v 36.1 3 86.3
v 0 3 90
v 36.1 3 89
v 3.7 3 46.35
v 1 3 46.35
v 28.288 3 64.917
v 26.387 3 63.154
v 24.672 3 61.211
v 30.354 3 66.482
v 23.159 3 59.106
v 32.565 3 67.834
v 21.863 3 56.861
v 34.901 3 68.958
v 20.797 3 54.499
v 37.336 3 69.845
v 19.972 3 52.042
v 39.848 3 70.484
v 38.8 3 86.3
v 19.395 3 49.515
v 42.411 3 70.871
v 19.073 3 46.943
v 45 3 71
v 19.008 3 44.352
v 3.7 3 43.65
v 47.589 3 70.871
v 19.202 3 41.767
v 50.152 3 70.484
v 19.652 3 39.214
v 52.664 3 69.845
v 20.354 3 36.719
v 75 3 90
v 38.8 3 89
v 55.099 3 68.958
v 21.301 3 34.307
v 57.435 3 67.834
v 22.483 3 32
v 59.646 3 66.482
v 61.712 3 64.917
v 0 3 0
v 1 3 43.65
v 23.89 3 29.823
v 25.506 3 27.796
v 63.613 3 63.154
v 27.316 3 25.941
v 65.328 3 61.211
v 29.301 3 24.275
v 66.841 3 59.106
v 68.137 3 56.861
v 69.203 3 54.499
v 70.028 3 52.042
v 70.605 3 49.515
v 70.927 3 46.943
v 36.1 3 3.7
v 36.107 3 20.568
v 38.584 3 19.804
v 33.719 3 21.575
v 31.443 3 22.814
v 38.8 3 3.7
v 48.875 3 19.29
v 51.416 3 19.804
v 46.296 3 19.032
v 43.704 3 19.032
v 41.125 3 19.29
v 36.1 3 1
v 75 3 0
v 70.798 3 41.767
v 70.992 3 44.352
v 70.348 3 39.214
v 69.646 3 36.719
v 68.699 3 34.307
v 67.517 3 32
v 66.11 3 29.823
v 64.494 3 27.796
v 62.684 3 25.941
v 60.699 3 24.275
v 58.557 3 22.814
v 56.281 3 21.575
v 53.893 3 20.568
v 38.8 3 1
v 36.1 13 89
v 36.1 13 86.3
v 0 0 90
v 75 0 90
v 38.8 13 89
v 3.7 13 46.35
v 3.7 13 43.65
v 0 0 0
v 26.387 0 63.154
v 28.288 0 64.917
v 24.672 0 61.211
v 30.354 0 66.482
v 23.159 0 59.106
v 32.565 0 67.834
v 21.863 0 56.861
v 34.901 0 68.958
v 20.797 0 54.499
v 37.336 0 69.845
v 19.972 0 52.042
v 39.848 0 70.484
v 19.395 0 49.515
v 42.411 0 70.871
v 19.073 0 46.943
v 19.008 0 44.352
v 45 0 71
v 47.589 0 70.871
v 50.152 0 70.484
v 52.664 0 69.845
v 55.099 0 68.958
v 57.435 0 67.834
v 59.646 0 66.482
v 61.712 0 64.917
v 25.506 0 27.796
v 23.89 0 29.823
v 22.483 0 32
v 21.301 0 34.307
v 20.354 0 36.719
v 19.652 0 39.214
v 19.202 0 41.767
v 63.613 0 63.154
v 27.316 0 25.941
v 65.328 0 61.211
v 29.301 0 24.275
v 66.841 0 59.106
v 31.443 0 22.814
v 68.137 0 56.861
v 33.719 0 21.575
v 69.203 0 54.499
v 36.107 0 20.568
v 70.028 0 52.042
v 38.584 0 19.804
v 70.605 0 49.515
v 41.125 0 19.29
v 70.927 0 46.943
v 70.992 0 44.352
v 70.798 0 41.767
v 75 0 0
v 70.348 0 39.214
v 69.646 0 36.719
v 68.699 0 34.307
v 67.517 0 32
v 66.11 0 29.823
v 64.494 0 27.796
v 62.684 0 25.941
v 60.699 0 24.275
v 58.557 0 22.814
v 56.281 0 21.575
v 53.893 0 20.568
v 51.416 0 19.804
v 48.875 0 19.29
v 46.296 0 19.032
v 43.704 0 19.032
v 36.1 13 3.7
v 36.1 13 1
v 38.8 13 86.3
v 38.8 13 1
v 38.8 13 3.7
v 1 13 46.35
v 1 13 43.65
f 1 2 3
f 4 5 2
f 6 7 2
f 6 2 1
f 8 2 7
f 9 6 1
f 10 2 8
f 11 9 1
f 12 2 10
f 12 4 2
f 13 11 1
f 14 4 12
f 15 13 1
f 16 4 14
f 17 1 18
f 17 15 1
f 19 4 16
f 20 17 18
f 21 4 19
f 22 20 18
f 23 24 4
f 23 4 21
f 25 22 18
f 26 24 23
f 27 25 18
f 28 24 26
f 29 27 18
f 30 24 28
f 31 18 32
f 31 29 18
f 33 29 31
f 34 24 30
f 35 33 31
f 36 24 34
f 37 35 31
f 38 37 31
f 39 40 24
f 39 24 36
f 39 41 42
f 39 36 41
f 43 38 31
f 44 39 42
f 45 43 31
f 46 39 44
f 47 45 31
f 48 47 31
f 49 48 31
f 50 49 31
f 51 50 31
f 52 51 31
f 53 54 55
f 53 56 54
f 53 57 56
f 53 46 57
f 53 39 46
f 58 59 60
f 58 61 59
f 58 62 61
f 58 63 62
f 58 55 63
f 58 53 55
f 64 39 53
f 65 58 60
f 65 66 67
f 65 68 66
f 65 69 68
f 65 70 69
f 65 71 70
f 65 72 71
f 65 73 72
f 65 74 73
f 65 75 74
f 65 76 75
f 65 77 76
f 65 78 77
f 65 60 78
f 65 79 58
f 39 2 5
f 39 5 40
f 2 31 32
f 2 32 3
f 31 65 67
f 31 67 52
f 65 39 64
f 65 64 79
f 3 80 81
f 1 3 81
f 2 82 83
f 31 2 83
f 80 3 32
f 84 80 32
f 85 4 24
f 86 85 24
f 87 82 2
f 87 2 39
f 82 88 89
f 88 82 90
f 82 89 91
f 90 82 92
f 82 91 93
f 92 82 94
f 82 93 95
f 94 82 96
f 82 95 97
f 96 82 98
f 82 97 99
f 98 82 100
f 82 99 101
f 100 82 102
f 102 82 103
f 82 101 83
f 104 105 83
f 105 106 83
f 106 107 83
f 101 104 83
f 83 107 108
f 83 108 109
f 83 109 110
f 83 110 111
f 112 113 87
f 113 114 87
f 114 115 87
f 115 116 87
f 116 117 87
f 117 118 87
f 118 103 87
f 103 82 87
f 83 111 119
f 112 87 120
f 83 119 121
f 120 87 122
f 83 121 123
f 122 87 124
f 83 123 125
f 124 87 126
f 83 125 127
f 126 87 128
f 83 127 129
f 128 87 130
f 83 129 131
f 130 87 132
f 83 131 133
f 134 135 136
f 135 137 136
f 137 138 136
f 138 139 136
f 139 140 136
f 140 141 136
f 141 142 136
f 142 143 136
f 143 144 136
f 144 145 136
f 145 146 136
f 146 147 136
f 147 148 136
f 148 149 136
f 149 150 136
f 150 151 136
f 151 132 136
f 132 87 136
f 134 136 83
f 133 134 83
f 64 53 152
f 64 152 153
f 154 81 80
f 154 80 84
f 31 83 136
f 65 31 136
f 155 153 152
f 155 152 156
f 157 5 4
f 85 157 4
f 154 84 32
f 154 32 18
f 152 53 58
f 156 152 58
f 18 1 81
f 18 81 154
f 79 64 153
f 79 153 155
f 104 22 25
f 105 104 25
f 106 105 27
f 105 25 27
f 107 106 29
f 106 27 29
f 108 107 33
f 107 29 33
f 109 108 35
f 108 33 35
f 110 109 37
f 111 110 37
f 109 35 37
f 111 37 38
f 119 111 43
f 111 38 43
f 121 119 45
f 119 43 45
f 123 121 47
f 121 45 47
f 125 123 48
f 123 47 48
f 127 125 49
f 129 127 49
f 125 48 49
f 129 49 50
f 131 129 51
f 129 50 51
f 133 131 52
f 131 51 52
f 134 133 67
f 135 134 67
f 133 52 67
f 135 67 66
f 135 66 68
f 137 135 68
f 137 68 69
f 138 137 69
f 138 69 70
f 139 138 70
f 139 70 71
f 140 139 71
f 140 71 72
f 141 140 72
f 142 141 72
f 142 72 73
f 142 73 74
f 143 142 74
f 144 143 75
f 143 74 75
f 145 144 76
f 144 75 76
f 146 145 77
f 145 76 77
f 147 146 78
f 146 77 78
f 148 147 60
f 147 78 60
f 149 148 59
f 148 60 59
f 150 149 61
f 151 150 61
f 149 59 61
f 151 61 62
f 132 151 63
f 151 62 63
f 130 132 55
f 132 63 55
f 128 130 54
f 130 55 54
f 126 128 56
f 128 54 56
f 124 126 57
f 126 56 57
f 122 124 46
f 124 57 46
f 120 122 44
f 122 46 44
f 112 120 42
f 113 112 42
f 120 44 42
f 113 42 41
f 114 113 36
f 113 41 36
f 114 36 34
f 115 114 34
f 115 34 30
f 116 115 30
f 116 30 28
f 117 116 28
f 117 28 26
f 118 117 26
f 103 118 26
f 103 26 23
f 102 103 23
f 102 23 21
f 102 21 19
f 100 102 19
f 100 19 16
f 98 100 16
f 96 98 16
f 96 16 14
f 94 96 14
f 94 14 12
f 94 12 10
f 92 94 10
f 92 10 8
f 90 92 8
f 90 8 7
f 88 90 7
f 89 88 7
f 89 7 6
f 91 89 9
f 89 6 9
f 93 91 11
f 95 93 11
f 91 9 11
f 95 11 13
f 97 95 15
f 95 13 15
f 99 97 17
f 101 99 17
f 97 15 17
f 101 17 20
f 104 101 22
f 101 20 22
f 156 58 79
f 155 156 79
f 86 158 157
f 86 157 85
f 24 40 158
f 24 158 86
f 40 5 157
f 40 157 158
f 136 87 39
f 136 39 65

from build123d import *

# Parameters (mm, degrees)
SKETCH1_W           = 75
SKETCH1_H           = 90
BOSS_EXTRUDE1_DEPTH = 3
SKETCH2_W           = 2.7
SKETCH2_H           = 2.7
BOSS_EXTRUDE2_DEPTH = 10
SKETCH3_R           = 26
CUT_EXTRUDE1_DEPTH  = 3


with BuildPart() as part:
    # Sketch1 → Boss-Extrude1 (new body)
    with BuildSketch(Plane(origin=(0, 0, 0), x_dir=(1, 0, 0), z_dir=(0, 1, 0))):
        with Locations((37.5, -45)):
            Rectangle(SKETCH1_W, SKETCH1_H)
    extrude(amount=BOSS_EXTRUDE1_DEPTH)

    # Sketch2 → Boss-Extrude2 (add)
    with BuildSketch(Plane(origin=(0, 3, 0), x_dir=(1, 0, 0), z_dir=(0, 1, 0))):
        with Locations((37.45, -2.35)):
            Rectangle(SKETCH2_W, SKETCH2_H)
        with Locations((2.35, -45)):
            Rectangle(SKETCH2_W, SKETCH2_H)
        with Locations((37.45, -87.65)):
            Rectangle(SKETCH2_W, SKETCH2_H)
    extrude(amount=BOSS_EXTRUDE2_DEPTH)

    # Sketch3 → Cut-Extrude1 (cut)
    with BuildSketch(Plane(origin=(0, 3, 0), x_dir=(1, 0, 0), z_dir=(0, 1, 0))):
        with Locations(Location((45, -45, 0), (0, 0, 270))):
            Circle(SKETCH3_R)
    extrude(amount=-CUT_EXTRUDE1_DEPTH, mode=Mode.SUBTRACT)


solid = part.part
